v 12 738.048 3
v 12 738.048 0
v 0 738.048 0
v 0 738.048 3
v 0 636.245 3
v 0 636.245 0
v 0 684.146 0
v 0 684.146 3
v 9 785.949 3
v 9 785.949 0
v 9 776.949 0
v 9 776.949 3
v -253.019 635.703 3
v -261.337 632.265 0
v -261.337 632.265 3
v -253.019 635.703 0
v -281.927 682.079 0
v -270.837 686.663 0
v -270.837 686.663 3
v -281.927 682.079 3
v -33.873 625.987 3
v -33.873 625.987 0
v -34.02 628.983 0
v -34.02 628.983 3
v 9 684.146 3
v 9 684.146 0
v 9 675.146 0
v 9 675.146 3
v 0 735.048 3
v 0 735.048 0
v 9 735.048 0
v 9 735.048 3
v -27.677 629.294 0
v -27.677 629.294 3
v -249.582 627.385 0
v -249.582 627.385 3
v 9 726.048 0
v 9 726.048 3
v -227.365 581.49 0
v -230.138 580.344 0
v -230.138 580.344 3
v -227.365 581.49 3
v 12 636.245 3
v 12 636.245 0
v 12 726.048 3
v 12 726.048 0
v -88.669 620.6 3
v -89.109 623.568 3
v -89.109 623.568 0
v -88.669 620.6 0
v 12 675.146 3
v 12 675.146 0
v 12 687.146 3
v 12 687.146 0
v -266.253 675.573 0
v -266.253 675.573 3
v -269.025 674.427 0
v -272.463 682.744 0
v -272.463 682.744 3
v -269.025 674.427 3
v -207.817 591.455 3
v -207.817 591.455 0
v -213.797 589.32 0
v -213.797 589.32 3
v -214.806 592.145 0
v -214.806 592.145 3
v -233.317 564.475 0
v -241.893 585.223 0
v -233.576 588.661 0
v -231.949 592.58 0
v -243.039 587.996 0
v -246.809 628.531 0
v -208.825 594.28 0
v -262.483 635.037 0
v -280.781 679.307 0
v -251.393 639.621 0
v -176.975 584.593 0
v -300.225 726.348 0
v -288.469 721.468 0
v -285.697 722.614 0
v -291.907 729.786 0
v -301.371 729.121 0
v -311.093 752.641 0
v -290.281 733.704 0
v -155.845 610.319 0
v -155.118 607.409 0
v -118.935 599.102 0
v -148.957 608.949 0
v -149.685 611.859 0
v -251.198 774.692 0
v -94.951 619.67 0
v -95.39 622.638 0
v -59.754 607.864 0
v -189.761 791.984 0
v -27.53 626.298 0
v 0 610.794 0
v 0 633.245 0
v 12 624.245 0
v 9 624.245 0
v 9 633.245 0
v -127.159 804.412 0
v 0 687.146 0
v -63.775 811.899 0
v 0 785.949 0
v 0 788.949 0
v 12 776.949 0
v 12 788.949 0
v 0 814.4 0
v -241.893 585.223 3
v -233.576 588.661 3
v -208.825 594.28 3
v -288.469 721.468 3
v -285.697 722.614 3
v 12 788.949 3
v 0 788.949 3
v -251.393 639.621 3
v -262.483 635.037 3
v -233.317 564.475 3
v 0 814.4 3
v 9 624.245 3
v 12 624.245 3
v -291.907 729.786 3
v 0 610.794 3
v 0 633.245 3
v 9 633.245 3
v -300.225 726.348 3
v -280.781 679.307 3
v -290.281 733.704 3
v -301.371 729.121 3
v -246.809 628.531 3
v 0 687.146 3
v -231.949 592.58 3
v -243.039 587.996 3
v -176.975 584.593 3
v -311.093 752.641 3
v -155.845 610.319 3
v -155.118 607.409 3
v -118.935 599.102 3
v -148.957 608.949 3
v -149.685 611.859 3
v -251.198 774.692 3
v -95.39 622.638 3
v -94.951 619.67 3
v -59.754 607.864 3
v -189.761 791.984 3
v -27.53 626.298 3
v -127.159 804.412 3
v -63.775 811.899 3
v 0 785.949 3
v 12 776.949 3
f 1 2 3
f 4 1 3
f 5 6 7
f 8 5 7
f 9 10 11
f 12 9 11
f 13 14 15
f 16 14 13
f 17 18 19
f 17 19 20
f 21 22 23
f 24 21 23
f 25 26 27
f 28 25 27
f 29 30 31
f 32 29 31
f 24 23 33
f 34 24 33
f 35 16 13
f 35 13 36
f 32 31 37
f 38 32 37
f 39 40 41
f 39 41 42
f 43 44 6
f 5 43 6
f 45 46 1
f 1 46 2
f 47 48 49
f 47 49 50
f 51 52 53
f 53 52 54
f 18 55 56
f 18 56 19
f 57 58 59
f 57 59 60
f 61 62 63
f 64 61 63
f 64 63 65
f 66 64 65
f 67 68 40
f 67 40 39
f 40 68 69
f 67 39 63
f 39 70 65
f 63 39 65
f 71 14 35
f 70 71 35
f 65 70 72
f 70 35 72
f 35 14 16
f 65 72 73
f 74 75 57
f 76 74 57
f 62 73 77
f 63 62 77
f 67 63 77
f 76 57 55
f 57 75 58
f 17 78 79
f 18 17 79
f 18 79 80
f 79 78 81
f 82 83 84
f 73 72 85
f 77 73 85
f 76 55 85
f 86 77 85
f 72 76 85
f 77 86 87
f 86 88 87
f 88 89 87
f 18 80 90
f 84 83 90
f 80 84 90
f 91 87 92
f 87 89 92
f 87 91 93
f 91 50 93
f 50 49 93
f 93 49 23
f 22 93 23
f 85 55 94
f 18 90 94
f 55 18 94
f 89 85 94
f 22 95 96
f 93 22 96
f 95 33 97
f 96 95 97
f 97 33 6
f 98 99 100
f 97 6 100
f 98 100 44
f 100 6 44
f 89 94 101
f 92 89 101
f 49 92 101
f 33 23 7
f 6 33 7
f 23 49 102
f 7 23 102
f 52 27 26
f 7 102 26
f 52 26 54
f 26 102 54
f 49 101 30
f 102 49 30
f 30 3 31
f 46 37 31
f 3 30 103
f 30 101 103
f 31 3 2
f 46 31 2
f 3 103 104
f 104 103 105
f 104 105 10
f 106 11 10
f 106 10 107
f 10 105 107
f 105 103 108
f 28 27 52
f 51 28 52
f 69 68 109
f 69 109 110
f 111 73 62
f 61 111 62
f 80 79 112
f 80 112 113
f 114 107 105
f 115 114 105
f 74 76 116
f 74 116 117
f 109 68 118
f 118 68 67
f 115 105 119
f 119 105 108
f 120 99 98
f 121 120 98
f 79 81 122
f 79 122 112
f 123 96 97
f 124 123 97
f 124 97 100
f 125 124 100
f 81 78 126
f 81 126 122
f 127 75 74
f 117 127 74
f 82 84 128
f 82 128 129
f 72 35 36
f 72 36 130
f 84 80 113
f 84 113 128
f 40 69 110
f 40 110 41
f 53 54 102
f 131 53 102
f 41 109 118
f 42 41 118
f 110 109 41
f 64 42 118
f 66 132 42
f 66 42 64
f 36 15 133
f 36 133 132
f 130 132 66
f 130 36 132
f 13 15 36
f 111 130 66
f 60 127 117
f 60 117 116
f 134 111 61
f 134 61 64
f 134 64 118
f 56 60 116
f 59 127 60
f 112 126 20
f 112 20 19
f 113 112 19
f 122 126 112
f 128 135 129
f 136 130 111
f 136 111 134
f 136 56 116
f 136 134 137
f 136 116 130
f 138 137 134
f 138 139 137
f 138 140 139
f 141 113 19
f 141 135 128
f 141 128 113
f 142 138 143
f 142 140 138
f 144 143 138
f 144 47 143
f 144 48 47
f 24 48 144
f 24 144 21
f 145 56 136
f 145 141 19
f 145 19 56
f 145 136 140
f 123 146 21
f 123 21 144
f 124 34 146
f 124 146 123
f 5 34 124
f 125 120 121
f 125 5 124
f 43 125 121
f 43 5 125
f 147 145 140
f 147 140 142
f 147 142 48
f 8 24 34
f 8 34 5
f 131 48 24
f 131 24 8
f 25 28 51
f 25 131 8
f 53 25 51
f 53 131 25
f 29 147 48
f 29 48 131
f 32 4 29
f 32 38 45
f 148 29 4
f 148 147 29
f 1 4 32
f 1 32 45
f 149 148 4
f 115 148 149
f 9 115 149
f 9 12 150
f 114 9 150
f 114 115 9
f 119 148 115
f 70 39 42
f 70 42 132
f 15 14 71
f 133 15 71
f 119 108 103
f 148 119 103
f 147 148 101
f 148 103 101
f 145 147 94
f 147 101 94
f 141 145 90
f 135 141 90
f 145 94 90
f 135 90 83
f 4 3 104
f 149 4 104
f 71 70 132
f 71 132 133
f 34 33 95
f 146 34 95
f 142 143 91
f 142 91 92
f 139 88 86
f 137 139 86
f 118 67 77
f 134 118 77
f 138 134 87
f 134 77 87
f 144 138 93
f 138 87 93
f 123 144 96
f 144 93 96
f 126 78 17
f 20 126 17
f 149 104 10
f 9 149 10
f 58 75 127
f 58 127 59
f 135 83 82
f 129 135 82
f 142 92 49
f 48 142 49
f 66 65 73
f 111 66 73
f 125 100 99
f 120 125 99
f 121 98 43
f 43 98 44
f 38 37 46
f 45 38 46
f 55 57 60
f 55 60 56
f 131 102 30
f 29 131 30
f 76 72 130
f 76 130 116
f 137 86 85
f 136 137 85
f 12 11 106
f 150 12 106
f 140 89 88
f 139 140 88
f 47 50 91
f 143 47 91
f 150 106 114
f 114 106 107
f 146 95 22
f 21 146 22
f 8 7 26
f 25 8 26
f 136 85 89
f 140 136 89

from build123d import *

# Parameters (mm, degrees)
F3_DEPTH = 3
F4_DEPTH = 3
F5_DEPTH = 3.001


with BuildPart() as f3:
    # F0 (on Top) → F3 (new body)
    with BuildSketch(Plane.XY):
        with BuildLine():
            ThreePointArc((-233.3171, 564.475152), (-118.935157, 599.10224), (0, 610.7938))
            Line((0, 610.7938), (0, 814.4002))
            ThreePointArc((0, 814.4002), (-158.581858, 798.811292), (-311.092701, 752.64136))
            Line((-311.092701, 752.64136), (-233.3171, 564.475152))
        make_face()
        Polygon((-214.805697, 592.145084), (-208.825489, 594.280408), (-207.816675, 591.455112), (-213.796883, 589.319788), align=None, mode=Mode.SUBTRACT)
        Polygon((-155.117917, 607.408719), (-155.845492, 610.319154), (-149.685071, 611.859189), (-148.957495, 608.948754), align=None, mode=Mode.SUBTRACT)
        Polygon((-94.95078, 619.670291), (-95.390136, 622.637944), (-89.108603, 623.567915), (-88.669247, 620.600262), align=None, mode=Mode.SUBTRACT)
        Polygon((-33.872704, 625.986869), (-34.019626, 628.983269), (-27.677246, 629.294254), (-27.530324, 626.297854), align=None, mode=Mode.SUBTRACT)
    extrude(amount=F3_DEPTH)

    # F2 (on Top) → F4 (join)
    with BuildSketch(Plane.XY):
        Polygon((9, 785.9494), (9, 776.9494), (12, 776.9494), (12, 788.9494), (0, 788.9494), (0, 785.9494), align=None)
        Polygon((9, 735.0478), (9, 726.0478), (12, 726.0478), (12, 738.0478), (0, 738.0478), (0, 735.0478), align=None)
        Polygon((12, 636.2446), (0, 636.2446), (0, 633.2446), (9, 633.2446), (9, 624.2446), (12, 624.2446), align=None)
        Polygon((9, 684.1462), (9, 675.1462), (12, 675.1462), (12, 687.1462), (0, 687.1462), (0, 684.1462), align=None)
    extrude(amount=F4_DEPTH)

    # F2 (on Top) → F5 (cut, through all)
    with BuildSketch(Plane.XY):
        Polygon((-227.36518, 581.489807), (-231.94906, 592.579805), (-243.039057, 587.995925), (-241.893087, 585.223425), (-233.575589, 588.661335), (-230.137679, 580.343837), align=None)
        Polygon((-285.696882, 722.614463), (-290.280762, 733.70446), (-301.37076, 729.120581), (-300.22479, 726.348081), (-291.907292, 729.785991), (-288.469382, 721.468493), align=None)
        Polygon((-251.392961, 639.621356), (-262.482958, 635.037477), (-261.336988, 632.264977), (-253.01949, 635.702887), (-249.58158, 627.385389), (-246.809081, 628.531359), align=None)
        Polygon((-280.780889, 679.306529), (-272.463391, 682.744439), (-269.025481, 674.426941), (-266.252982, 675.572911), (-270.836861, 686.662908), (-281.926859, 682.079029), align=None)
    extrude(amount=F5_DEPTH, mode=Mode.SUBTRACT)


solid = f3.part
